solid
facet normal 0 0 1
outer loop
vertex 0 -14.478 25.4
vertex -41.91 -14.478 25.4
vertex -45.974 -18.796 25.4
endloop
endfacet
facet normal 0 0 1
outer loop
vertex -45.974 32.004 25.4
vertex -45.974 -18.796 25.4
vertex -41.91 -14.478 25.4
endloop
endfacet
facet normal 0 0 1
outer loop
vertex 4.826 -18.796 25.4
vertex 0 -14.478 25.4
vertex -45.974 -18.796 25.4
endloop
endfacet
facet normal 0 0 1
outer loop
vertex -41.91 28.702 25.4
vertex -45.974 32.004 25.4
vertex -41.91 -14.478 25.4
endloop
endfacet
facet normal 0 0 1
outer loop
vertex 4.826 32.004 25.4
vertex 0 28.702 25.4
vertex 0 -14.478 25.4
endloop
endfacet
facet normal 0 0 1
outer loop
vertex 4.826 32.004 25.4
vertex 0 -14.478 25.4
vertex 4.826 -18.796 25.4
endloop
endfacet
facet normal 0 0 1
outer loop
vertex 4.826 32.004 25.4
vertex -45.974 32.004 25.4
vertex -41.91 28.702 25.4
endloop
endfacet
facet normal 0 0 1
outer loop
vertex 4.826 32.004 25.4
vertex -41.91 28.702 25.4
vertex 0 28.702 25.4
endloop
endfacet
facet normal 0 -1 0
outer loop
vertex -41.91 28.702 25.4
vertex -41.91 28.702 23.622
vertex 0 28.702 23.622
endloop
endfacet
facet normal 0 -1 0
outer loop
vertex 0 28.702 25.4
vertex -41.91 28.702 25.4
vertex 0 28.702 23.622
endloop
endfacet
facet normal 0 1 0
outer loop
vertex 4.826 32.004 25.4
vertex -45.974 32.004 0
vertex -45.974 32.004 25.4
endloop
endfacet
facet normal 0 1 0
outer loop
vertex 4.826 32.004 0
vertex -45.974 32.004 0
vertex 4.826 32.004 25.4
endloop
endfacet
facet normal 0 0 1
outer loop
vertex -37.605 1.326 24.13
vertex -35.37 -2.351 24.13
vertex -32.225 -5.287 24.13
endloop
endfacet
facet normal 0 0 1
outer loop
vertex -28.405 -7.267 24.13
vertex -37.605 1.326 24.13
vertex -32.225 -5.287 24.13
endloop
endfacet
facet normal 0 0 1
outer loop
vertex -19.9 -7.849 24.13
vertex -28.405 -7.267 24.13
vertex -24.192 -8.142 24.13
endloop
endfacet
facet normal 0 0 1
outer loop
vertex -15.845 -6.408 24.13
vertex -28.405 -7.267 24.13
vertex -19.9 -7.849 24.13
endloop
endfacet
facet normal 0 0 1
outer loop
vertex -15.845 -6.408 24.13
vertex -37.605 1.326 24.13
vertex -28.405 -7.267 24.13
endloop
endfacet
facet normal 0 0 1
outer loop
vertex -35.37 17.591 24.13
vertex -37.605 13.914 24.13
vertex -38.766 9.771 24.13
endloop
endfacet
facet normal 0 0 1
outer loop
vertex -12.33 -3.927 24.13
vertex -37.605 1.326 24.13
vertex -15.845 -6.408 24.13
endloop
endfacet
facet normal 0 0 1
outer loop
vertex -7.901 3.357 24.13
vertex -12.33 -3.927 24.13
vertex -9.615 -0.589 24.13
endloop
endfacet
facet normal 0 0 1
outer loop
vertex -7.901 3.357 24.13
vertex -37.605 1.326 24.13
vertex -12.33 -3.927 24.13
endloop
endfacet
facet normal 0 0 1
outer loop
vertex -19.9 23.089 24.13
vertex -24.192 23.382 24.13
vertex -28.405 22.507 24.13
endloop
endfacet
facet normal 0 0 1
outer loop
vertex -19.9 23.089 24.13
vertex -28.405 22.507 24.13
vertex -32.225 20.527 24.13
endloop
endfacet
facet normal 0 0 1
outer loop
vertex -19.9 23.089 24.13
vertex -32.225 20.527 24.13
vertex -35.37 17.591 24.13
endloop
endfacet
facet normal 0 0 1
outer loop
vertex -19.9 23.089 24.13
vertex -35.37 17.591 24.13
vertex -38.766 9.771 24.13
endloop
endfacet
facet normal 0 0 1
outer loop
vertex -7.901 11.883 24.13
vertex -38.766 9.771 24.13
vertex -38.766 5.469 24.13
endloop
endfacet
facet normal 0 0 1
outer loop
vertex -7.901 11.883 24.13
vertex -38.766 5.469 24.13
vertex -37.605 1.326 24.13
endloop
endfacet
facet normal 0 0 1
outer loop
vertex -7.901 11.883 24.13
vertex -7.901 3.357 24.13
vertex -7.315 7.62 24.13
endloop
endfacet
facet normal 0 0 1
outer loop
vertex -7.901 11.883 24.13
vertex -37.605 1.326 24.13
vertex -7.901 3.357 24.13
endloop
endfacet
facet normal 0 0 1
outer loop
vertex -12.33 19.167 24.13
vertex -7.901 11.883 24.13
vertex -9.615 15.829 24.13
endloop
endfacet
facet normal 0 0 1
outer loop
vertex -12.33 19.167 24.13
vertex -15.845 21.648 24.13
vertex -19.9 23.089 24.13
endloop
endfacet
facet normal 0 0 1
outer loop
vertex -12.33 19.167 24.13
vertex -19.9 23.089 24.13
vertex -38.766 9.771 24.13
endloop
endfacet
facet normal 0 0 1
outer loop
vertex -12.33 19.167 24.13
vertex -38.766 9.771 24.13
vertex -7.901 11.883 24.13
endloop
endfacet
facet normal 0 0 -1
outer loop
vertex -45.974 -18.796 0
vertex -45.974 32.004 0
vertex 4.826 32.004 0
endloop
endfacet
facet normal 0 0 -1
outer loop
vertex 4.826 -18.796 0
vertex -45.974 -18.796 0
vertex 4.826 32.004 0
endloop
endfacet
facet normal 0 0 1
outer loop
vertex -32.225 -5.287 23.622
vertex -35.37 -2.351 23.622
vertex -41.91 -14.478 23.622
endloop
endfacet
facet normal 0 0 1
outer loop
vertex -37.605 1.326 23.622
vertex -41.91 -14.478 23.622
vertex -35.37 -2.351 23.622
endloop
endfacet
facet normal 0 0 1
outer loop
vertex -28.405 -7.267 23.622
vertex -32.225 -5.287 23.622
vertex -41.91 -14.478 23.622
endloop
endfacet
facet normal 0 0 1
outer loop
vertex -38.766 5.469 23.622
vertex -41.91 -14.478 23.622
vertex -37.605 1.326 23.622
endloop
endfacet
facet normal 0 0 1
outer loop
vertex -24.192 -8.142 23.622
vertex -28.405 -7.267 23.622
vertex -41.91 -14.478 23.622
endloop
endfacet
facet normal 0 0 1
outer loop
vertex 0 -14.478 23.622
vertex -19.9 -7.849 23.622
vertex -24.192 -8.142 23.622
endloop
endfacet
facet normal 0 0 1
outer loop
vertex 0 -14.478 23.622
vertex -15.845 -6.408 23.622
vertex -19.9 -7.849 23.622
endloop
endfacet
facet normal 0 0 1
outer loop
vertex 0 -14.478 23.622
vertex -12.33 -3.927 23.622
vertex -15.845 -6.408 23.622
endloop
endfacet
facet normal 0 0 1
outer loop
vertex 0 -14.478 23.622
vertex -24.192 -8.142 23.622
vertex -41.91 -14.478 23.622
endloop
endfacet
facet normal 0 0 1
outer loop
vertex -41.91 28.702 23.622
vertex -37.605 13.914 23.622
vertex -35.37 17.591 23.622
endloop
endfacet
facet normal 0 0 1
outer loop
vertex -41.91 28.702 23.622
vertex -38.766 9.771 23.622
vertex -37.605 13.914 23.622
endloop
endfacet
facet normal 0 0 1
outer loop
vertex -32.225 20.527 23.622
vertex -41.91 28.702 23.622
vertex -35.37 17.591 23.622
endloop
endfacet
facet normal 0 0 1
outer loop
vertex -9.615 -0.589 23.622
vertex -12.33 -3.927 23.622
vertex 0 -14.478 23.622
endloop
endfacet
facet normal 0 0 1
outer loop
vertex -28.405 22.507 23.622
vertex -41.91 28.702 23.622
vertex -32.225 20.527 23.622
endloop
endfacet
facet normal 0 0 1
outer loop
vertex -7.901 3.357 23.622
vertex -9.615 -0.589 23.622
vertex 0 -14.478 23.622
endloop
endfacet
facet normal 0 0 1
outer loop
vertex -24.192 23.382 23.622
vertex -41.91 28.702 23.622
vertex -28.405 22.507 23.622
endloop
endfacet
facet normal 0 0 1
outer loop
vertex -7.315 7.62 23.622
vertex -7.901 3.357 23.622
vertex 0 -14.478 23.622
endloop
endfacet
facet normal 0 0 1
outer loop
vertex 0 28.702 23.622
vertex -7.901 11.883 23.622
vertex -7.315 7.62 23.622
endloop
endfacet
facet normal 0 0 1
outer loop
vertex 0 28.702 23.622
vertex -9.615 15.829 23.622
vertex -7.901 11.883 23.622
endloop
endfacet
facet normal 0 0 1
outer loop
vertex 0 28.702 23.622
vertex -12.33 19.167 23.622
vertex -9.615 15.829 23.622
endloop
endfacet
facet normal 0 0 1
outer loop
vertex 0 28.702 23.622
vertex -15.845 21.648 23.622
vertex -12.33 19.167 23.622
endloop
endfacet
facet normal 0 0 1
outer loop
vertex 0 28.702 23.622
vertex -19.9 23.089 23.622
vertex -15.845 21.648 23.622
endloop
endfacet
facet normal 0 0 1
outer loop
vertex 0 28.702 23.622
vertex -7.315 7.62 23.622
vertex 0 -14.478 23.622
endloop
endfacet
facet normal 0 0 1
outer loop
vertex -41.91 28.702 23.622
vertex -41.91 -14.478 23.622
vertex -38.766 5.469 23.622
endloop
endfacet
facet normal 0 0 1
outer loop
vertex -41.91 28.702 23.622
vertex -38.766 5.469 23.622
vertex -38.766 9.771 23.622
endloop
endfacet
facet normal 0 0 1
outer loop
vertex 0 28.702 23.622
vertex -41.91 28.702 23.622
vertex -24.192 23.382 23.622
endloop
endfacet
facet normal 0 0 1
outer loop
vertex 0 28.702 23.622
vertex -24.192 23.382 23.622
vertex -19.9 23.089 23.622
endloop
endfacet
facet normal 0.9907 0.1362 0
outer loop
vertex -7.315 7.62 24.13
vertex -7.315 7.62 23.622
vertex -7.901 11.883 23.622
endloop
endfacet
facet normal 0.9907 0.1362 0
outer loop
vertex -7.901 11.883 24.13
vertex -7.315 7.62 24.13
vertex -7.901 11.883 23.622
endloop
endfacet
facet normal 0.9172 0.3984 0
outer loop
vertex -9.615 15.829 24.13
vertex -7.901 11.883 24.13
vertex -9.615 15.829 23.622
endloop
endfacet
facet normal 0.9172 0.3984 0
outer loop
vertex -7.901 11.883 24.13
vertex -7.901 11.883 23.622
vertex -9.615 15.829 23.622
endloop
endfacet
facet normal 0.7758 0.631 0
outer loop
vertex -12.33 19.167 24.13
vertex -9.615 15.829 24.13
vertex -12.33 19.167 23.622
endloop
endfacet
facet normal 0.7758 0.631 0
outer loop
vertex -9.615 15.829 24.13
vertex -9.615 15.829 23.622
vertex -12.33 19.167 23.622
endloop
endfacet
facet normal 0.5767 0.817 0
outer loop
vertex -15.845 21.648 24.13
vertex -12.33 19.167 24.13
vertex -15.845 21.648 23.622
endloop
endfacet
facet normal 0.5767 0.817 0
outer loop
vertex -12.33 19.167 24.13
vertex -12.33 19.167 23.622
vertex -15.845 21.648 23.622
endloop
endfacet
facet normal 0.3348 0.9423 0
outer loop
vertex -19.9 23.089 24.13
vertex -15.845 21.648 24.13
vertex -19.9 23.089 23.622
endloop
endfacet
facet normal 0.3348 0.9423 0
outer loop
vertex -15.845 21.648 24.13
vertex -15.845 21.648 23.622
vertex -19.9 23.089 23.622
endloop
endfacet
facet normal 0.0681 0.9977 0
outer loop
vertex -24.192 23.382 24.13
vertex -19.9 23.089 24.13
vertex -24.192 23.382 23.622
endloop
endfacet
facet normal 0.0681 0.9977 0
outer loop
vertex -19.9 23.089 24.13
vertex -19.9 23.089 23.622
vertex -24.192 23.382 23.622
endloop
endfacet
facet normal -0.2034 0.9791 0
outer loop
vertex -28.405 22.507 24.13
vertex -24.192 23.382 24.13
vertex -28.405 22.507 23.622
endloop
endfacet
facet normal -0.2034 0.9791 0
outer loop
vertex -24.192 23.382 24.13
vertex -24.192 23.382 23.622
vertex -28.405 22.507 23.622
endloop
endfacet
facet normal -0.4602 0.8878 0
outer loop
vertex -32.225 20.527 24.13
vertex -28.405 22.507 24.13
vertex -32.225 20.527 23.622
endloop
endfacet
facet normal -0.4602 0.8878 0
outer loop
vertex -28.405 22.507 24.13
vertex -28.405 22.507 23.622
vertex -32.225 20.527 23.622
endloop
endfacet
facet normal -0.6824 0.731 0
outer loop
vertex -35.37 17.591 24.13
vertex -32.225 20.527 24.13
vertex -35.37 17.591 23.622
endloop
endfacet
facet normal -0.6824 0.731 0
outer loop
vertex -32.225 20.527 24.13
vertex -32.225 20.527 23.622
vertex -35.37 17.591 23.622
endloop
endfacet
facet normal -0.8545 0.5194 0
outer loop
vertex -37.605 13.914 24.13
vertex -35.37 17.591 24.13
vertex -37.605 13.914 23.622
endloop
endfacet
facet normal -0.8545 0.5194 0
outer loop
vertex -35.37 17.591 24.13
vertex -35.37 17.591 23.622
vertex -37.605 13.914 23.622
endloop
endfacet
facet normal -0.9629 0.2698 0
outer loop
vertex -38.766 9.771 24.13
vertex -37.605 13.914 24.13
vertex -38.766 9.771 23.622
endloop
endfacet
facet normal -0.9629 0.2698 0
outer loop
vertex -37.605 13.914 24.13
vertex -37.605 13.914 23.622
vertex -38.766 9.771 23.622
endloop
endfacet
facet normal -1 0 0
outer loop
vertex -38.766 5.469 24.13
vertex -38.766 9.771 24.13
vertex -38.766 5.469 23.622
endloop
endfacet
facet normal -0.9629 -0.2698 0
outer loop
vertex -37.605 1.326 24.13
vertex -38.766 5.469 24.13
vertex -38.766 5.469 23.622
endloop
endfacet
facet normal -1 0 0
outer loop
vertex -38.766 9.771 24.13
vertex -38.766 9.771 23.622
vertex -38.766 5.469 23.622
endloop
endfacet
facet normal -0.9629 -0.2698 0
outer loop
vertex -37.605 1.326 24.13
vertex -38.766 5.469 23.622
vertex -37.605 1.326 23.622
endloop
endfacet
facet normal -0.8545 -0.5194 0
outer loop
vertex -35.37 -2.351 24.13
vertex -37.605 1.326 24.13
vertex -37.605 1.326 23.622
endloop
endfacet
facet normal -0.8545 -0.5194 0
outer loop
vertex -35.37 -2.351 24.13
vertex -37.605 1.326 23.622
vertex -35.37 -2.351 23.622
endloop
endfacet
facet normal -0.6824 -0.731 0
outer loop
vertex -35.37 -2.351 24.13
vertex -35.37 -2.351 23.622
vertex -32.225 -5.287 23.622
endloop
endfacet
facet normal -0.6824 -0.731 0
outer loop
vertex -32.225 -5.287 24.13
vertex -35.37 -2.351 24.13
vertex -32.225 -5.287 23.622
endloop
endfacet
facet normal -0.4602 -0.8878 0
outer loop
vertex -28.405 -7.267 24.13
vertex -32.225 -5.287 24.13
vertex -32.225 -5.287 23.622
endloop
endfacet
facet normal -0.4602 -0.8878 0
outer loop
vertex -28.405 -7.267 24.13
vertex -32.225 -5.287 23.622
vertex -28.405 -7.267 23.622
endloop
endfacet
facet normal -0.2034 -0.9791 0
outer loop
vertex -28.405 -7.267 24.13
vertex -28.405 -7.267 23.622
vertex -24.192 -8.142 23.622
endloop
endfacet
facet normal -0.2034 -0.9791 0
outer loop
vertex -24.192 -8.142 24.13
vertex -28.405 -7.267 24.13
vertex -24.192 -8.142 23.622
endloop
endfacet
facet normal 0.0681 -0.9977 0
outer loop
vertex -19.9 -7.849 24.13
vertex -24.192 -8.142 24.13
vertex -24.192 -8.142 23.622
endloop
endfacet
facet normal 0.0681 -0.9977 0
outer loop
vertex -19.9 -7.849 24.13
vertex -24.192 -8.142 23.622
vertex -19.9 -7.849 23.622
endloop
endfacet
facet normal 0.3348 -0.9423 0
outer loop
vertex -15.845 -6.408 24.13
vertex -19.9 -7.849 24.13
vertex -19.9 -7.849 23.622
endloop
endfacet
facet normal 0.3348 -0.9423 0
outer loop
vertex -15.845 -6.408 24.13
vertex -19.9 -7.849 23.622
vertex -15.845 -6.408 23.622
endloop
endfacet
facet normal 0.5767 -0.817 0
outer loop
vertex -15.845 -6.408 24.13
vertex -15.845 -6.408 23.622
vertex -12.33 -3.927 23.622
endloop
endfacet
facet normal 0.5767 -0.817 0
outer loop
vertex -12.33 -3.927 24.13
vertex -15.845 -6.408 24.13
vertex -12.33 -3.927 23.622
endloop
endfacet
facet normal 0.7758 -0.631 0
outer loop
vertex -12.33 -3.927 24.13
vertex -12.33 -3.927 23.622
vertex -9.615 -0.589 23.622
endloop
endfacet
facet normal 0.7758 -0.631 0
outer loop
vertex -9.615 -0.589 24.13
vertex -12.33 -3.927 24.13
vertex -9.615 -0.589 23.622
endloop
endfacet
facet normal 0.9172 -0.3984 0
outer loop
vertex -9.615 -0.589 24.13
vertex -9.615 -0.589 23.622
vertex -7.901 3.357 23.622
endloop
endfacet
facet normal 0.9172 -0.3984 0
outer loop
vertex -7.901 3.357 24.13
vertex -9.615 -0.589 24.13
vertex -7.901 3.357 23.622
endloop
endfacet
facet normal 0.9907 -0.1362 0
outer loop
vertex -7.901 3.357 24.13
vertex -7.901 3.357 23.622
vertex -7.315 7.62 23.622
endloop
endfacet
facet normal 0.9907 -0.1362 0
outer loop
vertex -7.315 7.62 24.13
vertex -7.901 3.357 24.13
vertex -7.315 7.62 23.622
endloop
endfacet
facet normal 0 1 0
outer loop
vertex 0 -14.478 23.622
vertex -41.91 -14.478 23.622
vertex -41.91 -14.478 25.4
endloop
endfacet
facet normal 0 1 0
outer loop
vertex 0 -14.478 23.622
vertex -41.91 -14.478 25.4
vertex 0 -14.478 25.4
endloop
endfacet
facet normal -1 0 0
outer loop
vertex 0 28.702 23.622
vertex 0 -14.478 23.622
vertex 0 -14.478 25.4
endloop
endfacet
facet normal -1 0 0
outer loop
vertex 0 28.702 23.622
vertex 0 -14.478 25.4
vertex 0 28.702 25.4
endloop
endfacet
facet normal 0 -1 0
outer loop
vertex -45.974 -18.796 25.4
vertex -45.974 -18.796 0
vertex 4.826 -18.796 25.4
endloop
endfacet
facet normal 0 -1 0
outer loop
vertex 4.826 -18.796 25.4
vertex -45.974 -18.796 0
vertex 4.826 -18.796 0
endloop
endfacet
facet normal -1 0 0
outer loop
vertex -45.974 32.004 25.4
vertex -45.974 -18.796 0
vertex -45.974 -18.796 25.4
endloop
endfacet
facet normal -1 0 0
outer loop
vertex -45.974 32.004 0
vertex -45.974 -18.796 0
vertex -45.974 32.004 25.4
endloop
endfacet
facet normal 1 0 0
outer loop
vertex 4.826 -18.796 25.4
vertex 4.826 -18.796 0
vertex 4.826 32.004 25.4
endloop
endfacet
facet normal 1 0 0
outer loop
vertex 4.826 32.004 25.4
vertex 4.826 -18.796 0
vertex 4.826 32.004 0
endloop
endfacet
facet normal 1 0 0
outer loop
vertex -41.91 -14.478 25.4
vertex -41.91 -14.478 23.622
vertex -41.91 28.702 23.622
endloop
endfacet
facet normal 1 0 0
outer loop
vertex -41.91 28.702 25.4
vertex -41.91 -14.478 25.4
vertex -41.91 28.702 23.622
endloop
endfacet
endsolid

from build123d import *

# Parameters (mm, degrees)
F0_W     = 50.8
F0_H     = 50.8
F0_W_2   = 41.91
F0_H_2   = 43.180001
F1_DEPTH = 25.4
F0_R     = 15.799126
F2_DEPTH = 23.622
F3_DEPTH = 24.13


with BuildPart() as f1:
    # F0 (on Top) → F1 (new body)
    with BuildSketch(Plane.XY):
        with Locations((-20.574001, 6.603999)):
            Rectangle(F0_W, F0_H)
        with Locations((-20.955, 7.111999)):
            Rectangle(F0_W_2, F0_H_2, mode=Mode.SUBTRACT)
    extrude(amount=F1_DEPTH)

    # F0 (on Top) → F2 (join)
    with BuildSketch(Plane.XY):
        with Locations((-20.574001, 6.603999)):
            Rectangle(F0_W, F0_H)
        with Locations((-20.955, 7.111999)):
            Rectangle(F0_W_2, F0_H_2, mode=Mode.SUBTRACT)
        with Locations((-20.955, 7.111999)):
            Rectangle(F0_W_2, F0_H_2)
        with Locations((-23.114, 7.62)):
            Circle(F0_R, mode=Mode.SUBTRACT)
    extrude(amount=F2_DEPTH)

    # F0 (on Top) → F3 (join)
    with BuildSketch(Plane.XY):
        with Locations((-23.114, 7.62)):
            Circle(F0_R)
    extrude(amount=F3_DEPTH)


solid = f1.part
